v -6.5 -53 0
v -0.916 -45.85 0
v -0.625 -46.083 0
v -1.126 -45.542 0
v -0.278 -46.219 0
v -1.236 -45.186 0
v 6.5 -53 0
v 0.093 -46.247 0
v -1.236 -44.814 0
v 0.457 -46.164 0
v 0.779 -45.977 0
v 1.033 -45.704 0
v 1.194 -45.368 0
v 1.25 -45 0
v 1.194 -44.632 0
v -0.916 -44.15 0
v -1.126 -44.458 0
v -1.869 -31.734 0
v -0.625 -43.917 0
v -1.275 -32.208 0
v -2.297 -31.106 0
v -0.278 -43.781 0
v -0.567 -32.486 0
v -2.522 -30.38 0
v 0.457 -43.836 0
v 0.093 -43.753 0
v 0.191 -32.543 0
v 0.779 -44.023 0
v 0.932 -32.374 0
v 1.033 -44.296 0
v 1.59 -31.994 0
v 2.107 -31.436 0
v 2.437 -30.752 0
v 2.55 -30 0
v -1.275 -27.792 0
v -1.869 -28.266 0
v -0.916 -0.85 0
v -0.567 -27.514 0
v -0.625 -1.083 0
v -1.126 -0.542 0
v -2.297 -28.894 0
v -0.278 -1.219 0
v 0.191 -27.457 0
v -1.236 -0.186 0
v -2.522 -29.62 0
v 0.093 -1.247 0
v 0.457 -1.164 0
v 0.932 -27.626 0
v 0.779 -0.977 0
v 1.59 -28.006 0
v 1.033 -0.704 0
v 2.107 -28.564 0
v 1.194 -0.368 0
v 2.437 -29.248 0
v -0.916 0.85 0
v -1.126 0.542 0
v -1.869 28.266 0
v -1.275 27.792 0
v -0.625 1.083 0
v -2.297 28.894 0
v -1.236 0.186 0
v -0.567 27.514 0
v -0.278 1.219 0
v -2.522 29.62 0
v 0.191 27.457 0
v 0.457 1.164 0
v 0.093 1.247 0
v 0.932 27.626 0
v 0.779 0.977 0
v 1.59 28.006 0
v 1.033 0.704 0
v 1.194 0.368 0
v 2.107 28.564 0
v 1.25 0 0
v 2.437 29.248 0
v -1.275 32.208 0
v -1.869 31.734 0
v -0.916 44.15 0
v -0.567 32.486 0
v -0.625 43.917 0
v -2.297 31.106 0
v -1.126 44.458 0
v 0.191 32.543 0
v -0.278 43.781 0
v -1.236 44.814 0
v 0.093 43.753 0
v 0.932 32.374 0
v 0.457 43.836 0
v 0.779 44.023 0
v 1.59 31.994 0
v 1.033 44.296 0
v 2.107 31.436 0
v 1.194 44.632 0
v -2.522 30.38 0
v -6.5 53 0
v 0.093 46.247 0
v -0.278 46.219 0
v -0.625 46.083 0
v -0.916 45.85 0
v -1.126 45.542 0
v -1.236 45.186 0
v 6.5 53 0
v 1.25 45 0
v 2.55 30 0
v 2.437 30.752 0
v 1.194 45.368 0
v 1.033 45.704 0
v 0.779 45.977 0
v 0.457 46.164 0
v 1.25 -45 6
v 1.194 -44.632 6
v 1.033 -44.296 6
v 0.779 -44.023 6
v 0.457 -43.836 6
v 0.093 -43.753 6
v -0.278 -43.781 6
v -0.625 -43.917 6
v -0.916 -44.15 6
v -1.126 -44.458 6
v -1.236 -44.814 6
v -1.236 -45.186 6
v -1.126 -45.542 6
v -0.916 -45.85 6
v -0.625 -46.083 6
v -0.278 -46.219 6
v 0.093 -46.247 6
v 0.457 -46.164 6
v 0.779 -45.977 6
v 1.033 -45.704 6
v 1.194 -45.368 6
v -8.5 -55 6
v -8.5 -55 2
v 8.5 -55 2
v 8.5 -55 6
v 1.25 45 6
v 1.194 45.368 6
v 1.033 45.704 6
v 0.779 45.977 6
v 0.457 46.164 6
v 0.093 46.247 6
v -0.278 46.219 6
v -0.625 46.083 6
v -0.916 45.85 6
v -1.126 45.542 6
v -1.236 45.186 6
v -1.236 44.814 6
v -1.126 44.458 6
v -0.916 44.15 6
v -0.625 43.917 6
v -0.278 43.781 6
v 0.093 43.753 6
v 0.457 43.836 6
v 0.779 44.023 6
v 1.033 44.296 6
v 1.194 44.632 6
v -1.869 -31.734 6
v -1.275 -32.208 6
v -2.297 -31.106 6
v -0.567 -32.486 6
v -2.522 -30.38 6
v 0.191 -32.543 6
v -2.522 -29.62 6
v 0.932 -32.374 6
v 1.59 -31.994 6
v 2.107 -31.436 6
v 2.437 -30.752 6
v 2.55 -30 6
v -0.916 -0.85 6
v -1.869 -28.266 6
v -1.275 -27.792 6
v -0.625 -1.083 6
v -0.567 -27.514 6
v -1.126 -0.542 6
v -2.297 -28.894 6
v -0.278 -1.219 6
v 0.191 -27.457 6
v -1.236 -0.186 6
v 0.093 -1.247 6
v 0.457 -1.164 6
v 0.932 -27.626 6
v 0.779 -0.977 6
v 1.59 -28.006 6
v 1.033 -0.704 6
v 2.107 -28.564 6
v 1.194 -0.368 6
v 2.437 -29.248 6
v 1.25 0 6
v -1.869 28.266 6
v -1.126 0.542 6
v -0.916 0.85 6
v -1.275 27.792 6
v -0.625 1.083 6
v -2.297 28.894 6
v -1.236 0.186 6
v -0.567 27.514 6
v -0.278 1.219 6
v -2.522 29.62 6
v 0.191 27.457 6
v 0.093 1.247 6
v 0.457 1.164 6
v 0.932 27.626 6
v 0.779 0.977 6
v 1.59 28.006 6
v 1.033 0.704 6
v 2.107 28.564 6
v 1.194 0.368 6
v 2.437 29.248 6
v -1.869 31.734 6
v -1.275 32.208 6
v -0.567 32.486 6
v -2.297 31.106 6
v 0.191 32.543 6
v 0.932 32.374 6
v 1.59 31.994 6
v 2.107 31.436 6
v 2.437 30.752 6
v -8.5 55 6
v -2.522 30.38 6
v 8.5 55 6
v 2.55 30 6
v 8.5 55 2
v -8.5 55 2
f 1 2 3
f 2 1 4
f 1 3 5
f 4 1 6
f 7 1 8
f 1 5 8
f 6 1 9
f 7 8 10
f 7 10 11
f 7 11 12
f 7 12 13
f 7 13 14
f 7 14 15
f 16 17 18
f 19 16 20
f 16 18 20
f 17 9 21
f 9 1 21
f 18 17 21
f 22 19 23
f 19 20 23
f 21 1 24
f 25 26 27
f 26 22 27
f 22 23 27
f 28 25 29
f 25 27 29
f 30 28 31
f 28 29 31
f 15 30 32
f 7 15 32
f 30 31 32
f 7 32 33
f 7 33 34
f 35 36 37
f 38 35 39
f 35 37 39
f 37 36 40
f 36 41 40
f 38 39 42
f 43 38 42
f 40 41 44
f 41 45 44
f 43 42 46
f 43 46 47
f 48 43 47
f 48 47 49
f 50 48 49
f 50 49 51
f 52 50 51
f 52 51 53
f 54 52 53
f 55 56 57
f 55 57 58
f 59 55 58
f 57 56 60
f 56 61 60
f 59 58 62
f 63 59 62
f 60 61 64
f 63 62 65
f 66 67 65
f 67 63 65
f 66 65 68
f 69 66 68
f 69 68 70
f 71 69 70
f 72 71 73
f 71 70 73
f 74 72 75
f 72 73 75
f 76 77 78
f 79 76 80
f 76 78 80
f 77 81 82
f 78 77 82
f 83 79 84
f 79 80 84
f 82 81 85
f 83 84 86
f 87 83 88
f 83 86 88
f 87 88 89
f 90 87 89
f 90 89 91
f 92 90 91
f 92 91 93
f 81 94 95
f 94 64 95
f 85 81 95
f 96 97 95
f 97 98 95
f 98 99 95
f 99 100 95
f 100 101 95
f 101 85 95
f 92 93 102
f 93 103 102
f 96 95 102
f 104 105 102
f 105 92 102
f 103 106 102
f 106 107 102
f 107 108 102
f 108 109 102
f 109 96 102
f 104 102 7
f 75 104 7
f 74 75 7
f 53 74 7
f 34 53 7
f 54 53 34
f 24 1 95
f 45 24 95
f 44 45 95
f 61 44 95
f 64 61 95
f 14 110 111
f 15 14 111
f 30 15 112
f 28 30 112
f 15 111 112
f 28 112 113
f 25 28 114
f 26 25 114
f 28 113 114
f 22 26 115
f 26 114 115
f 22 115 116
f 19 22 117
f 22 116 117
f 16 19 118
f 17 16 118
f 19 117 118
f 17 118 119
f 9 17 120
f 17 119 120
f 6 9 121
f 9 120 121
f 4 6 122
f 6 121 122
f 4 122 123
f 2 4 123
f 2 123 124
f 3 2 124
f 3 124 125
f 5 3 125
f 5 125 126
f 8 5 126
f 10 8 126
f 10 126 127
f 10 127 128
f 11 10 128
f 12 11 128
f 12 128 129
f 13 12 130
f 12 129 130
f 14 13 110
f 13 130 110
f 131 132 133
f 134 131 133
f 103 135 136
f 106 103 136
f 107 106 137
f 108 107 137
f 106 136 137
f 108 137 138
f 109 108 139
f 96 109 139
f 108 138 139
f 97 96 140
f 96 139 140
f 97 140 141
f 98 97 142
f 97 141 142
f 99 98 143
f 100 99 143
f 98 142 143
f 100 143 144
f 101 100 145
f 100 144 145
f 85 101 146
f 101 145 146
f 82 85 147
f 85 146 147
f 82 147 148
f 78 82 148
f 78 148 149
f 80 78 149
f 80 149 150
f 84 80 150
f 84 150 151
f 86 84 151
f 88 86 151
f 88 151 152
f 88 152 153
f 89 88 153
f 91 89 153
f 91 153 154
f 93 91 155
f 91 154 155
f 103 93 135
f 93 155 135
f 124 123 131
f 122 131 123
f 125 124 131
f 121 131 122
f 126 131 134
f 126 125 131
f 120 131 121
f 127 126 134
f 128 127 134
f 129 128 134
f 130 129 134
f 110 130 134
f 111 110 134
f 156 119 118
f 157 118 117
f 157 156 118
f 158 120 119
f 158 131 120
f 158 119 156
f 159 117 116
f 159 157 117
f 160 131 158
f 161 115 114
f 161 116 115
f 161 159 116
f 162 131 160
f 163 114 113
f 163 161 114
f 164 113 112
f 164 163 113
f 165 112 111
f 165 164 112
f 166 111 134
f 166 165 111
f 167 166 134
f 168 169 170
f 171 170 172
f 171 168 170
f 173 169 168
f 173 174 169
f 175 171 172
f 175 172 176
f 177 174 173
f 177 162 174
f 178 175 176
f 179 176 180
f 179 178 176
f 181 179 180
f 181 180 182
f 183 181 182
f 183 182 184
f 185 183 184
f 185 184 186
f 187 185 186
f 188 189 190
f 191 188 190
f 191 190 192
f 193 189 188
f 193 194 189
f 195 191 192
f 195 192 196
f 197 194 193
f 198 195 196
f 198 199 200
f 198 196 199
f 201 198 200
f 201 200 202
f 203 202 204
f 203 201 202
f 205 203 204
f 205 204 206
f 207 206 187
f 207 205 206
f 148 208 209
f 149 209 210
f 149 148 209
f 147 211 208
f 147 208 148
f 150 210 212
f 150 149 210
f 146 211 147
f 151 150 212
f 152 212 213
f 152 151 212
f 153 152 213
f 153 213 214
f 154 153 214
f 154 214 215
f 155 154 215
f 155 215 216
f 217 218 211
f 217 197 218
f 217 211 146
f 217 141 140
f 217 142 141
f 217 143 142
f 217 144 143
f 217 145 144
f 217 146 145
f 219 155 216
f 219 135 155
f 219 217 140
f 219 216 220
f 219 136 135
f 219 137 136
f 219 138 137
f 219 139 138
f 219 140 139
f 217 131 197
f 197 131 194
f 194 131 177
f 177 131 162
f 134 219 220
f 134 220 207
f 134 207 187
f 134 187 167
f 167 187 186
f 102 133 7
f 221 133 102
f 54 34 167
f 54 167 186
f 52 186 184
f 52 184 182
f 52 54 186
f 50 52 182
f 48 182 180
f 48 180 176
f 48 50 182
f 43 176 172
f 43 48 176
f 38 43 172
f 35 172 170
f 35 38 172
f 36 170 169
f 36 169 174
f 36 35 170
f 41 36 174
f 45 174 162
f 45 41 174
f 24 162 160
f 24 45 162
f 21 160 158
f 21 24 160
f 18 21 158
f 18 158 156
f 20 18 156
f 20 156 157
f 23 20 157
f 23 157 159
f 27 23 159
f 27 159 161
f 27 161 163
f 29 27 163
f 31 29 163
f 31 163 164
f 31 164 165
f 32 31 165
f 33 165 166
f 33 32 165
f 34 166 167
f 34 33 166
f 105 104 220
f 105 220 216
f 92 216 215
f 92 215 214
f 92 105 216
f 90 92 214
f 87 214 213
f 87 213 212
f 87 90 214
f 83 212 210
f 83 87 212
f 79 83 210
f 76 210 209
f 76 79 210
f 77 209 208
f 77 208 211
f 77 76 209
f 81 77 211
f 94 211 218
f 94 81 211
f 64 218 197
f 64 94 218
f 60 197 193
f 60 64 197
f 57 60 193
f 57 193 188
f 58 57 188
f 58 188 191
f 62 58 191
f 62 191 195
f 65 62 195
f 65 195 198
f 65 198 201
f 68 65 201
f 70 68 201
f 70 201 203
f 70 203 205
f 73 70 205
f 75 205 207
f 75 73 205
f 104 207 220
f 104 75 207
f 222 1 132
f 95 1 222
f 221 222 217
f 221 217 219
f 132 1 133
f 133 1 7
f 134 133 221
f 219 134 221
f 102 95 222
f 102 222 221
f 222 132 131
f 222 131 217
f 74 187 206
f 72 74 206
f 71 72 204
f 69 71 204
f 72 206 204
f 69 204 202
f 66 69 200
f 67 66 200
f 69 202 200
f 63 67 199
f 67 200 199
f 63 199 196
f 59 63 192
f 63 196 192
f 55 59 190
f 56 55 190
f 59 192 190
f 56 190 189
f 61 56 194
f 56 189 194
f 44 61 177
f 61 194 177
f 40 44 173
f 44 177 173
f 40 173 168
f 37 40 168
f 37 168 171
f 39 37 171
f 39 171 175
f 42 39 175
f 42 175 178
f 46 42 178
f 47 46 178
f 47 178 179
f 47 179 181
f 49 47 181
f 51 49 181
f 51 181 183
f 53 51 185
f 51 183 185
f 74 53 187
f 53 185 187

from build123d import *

# Parameters (mm, degrees)
SKETCH_W      = 17
SKETCH_H      = 110
PAD_DEPTH     = 6
SKETCH001_R   = 2.55
HOLE_DEPTH    = 6
SKETCH002_R   = 1.25
HOLE001_DEPTH = 6
CHAMFER_SIZE  = 2


with BuildPart() as part:
    # Sketch → Pad (new body)
    with BuildSketch(Plane.XY):
        Rectangle(SKETCH_W, SKETCH_H)
    extrude(amount=PAD_DEPTH)

    # Sketch001 → Hole (cut)
    with BuildSketch(Plane.XY):
        with Locations((0, 30)):
            Circle(SKETCH001_R)
        with Locations((0, -30)):
            Circle(SKETCH001_R)
    extrude(amount=HOLE_DEPTH, mode=Mode.SUBTRACT)

    # Sketch002 (on Face6 of Pad) → Hole001 (cut)
    with BuildSketch(Plane.XY.offset(6)):
        with Locations((0, 45)):
            Circle(SKETCH002_R)
        with Locations((0, -45)):
            Circle(SKETCH002_R)
        Circle(SKETCH002_R)
    extrude(amount=-HOLE001_DEPTH, mode=Mode.SUBTRACT)

    # Chamfer
    chamfer_edges = [part.edges().sort_by_distance(p)[0] for p in [
        (0, -55, 0),
        (0, 55, 0),
        (-8.5, 0, 0),
        (8.5, 0, 0),
    ]]
    chamfer(chamfer_edges, length=CHAMFER_SIZE)


solid = part.part
